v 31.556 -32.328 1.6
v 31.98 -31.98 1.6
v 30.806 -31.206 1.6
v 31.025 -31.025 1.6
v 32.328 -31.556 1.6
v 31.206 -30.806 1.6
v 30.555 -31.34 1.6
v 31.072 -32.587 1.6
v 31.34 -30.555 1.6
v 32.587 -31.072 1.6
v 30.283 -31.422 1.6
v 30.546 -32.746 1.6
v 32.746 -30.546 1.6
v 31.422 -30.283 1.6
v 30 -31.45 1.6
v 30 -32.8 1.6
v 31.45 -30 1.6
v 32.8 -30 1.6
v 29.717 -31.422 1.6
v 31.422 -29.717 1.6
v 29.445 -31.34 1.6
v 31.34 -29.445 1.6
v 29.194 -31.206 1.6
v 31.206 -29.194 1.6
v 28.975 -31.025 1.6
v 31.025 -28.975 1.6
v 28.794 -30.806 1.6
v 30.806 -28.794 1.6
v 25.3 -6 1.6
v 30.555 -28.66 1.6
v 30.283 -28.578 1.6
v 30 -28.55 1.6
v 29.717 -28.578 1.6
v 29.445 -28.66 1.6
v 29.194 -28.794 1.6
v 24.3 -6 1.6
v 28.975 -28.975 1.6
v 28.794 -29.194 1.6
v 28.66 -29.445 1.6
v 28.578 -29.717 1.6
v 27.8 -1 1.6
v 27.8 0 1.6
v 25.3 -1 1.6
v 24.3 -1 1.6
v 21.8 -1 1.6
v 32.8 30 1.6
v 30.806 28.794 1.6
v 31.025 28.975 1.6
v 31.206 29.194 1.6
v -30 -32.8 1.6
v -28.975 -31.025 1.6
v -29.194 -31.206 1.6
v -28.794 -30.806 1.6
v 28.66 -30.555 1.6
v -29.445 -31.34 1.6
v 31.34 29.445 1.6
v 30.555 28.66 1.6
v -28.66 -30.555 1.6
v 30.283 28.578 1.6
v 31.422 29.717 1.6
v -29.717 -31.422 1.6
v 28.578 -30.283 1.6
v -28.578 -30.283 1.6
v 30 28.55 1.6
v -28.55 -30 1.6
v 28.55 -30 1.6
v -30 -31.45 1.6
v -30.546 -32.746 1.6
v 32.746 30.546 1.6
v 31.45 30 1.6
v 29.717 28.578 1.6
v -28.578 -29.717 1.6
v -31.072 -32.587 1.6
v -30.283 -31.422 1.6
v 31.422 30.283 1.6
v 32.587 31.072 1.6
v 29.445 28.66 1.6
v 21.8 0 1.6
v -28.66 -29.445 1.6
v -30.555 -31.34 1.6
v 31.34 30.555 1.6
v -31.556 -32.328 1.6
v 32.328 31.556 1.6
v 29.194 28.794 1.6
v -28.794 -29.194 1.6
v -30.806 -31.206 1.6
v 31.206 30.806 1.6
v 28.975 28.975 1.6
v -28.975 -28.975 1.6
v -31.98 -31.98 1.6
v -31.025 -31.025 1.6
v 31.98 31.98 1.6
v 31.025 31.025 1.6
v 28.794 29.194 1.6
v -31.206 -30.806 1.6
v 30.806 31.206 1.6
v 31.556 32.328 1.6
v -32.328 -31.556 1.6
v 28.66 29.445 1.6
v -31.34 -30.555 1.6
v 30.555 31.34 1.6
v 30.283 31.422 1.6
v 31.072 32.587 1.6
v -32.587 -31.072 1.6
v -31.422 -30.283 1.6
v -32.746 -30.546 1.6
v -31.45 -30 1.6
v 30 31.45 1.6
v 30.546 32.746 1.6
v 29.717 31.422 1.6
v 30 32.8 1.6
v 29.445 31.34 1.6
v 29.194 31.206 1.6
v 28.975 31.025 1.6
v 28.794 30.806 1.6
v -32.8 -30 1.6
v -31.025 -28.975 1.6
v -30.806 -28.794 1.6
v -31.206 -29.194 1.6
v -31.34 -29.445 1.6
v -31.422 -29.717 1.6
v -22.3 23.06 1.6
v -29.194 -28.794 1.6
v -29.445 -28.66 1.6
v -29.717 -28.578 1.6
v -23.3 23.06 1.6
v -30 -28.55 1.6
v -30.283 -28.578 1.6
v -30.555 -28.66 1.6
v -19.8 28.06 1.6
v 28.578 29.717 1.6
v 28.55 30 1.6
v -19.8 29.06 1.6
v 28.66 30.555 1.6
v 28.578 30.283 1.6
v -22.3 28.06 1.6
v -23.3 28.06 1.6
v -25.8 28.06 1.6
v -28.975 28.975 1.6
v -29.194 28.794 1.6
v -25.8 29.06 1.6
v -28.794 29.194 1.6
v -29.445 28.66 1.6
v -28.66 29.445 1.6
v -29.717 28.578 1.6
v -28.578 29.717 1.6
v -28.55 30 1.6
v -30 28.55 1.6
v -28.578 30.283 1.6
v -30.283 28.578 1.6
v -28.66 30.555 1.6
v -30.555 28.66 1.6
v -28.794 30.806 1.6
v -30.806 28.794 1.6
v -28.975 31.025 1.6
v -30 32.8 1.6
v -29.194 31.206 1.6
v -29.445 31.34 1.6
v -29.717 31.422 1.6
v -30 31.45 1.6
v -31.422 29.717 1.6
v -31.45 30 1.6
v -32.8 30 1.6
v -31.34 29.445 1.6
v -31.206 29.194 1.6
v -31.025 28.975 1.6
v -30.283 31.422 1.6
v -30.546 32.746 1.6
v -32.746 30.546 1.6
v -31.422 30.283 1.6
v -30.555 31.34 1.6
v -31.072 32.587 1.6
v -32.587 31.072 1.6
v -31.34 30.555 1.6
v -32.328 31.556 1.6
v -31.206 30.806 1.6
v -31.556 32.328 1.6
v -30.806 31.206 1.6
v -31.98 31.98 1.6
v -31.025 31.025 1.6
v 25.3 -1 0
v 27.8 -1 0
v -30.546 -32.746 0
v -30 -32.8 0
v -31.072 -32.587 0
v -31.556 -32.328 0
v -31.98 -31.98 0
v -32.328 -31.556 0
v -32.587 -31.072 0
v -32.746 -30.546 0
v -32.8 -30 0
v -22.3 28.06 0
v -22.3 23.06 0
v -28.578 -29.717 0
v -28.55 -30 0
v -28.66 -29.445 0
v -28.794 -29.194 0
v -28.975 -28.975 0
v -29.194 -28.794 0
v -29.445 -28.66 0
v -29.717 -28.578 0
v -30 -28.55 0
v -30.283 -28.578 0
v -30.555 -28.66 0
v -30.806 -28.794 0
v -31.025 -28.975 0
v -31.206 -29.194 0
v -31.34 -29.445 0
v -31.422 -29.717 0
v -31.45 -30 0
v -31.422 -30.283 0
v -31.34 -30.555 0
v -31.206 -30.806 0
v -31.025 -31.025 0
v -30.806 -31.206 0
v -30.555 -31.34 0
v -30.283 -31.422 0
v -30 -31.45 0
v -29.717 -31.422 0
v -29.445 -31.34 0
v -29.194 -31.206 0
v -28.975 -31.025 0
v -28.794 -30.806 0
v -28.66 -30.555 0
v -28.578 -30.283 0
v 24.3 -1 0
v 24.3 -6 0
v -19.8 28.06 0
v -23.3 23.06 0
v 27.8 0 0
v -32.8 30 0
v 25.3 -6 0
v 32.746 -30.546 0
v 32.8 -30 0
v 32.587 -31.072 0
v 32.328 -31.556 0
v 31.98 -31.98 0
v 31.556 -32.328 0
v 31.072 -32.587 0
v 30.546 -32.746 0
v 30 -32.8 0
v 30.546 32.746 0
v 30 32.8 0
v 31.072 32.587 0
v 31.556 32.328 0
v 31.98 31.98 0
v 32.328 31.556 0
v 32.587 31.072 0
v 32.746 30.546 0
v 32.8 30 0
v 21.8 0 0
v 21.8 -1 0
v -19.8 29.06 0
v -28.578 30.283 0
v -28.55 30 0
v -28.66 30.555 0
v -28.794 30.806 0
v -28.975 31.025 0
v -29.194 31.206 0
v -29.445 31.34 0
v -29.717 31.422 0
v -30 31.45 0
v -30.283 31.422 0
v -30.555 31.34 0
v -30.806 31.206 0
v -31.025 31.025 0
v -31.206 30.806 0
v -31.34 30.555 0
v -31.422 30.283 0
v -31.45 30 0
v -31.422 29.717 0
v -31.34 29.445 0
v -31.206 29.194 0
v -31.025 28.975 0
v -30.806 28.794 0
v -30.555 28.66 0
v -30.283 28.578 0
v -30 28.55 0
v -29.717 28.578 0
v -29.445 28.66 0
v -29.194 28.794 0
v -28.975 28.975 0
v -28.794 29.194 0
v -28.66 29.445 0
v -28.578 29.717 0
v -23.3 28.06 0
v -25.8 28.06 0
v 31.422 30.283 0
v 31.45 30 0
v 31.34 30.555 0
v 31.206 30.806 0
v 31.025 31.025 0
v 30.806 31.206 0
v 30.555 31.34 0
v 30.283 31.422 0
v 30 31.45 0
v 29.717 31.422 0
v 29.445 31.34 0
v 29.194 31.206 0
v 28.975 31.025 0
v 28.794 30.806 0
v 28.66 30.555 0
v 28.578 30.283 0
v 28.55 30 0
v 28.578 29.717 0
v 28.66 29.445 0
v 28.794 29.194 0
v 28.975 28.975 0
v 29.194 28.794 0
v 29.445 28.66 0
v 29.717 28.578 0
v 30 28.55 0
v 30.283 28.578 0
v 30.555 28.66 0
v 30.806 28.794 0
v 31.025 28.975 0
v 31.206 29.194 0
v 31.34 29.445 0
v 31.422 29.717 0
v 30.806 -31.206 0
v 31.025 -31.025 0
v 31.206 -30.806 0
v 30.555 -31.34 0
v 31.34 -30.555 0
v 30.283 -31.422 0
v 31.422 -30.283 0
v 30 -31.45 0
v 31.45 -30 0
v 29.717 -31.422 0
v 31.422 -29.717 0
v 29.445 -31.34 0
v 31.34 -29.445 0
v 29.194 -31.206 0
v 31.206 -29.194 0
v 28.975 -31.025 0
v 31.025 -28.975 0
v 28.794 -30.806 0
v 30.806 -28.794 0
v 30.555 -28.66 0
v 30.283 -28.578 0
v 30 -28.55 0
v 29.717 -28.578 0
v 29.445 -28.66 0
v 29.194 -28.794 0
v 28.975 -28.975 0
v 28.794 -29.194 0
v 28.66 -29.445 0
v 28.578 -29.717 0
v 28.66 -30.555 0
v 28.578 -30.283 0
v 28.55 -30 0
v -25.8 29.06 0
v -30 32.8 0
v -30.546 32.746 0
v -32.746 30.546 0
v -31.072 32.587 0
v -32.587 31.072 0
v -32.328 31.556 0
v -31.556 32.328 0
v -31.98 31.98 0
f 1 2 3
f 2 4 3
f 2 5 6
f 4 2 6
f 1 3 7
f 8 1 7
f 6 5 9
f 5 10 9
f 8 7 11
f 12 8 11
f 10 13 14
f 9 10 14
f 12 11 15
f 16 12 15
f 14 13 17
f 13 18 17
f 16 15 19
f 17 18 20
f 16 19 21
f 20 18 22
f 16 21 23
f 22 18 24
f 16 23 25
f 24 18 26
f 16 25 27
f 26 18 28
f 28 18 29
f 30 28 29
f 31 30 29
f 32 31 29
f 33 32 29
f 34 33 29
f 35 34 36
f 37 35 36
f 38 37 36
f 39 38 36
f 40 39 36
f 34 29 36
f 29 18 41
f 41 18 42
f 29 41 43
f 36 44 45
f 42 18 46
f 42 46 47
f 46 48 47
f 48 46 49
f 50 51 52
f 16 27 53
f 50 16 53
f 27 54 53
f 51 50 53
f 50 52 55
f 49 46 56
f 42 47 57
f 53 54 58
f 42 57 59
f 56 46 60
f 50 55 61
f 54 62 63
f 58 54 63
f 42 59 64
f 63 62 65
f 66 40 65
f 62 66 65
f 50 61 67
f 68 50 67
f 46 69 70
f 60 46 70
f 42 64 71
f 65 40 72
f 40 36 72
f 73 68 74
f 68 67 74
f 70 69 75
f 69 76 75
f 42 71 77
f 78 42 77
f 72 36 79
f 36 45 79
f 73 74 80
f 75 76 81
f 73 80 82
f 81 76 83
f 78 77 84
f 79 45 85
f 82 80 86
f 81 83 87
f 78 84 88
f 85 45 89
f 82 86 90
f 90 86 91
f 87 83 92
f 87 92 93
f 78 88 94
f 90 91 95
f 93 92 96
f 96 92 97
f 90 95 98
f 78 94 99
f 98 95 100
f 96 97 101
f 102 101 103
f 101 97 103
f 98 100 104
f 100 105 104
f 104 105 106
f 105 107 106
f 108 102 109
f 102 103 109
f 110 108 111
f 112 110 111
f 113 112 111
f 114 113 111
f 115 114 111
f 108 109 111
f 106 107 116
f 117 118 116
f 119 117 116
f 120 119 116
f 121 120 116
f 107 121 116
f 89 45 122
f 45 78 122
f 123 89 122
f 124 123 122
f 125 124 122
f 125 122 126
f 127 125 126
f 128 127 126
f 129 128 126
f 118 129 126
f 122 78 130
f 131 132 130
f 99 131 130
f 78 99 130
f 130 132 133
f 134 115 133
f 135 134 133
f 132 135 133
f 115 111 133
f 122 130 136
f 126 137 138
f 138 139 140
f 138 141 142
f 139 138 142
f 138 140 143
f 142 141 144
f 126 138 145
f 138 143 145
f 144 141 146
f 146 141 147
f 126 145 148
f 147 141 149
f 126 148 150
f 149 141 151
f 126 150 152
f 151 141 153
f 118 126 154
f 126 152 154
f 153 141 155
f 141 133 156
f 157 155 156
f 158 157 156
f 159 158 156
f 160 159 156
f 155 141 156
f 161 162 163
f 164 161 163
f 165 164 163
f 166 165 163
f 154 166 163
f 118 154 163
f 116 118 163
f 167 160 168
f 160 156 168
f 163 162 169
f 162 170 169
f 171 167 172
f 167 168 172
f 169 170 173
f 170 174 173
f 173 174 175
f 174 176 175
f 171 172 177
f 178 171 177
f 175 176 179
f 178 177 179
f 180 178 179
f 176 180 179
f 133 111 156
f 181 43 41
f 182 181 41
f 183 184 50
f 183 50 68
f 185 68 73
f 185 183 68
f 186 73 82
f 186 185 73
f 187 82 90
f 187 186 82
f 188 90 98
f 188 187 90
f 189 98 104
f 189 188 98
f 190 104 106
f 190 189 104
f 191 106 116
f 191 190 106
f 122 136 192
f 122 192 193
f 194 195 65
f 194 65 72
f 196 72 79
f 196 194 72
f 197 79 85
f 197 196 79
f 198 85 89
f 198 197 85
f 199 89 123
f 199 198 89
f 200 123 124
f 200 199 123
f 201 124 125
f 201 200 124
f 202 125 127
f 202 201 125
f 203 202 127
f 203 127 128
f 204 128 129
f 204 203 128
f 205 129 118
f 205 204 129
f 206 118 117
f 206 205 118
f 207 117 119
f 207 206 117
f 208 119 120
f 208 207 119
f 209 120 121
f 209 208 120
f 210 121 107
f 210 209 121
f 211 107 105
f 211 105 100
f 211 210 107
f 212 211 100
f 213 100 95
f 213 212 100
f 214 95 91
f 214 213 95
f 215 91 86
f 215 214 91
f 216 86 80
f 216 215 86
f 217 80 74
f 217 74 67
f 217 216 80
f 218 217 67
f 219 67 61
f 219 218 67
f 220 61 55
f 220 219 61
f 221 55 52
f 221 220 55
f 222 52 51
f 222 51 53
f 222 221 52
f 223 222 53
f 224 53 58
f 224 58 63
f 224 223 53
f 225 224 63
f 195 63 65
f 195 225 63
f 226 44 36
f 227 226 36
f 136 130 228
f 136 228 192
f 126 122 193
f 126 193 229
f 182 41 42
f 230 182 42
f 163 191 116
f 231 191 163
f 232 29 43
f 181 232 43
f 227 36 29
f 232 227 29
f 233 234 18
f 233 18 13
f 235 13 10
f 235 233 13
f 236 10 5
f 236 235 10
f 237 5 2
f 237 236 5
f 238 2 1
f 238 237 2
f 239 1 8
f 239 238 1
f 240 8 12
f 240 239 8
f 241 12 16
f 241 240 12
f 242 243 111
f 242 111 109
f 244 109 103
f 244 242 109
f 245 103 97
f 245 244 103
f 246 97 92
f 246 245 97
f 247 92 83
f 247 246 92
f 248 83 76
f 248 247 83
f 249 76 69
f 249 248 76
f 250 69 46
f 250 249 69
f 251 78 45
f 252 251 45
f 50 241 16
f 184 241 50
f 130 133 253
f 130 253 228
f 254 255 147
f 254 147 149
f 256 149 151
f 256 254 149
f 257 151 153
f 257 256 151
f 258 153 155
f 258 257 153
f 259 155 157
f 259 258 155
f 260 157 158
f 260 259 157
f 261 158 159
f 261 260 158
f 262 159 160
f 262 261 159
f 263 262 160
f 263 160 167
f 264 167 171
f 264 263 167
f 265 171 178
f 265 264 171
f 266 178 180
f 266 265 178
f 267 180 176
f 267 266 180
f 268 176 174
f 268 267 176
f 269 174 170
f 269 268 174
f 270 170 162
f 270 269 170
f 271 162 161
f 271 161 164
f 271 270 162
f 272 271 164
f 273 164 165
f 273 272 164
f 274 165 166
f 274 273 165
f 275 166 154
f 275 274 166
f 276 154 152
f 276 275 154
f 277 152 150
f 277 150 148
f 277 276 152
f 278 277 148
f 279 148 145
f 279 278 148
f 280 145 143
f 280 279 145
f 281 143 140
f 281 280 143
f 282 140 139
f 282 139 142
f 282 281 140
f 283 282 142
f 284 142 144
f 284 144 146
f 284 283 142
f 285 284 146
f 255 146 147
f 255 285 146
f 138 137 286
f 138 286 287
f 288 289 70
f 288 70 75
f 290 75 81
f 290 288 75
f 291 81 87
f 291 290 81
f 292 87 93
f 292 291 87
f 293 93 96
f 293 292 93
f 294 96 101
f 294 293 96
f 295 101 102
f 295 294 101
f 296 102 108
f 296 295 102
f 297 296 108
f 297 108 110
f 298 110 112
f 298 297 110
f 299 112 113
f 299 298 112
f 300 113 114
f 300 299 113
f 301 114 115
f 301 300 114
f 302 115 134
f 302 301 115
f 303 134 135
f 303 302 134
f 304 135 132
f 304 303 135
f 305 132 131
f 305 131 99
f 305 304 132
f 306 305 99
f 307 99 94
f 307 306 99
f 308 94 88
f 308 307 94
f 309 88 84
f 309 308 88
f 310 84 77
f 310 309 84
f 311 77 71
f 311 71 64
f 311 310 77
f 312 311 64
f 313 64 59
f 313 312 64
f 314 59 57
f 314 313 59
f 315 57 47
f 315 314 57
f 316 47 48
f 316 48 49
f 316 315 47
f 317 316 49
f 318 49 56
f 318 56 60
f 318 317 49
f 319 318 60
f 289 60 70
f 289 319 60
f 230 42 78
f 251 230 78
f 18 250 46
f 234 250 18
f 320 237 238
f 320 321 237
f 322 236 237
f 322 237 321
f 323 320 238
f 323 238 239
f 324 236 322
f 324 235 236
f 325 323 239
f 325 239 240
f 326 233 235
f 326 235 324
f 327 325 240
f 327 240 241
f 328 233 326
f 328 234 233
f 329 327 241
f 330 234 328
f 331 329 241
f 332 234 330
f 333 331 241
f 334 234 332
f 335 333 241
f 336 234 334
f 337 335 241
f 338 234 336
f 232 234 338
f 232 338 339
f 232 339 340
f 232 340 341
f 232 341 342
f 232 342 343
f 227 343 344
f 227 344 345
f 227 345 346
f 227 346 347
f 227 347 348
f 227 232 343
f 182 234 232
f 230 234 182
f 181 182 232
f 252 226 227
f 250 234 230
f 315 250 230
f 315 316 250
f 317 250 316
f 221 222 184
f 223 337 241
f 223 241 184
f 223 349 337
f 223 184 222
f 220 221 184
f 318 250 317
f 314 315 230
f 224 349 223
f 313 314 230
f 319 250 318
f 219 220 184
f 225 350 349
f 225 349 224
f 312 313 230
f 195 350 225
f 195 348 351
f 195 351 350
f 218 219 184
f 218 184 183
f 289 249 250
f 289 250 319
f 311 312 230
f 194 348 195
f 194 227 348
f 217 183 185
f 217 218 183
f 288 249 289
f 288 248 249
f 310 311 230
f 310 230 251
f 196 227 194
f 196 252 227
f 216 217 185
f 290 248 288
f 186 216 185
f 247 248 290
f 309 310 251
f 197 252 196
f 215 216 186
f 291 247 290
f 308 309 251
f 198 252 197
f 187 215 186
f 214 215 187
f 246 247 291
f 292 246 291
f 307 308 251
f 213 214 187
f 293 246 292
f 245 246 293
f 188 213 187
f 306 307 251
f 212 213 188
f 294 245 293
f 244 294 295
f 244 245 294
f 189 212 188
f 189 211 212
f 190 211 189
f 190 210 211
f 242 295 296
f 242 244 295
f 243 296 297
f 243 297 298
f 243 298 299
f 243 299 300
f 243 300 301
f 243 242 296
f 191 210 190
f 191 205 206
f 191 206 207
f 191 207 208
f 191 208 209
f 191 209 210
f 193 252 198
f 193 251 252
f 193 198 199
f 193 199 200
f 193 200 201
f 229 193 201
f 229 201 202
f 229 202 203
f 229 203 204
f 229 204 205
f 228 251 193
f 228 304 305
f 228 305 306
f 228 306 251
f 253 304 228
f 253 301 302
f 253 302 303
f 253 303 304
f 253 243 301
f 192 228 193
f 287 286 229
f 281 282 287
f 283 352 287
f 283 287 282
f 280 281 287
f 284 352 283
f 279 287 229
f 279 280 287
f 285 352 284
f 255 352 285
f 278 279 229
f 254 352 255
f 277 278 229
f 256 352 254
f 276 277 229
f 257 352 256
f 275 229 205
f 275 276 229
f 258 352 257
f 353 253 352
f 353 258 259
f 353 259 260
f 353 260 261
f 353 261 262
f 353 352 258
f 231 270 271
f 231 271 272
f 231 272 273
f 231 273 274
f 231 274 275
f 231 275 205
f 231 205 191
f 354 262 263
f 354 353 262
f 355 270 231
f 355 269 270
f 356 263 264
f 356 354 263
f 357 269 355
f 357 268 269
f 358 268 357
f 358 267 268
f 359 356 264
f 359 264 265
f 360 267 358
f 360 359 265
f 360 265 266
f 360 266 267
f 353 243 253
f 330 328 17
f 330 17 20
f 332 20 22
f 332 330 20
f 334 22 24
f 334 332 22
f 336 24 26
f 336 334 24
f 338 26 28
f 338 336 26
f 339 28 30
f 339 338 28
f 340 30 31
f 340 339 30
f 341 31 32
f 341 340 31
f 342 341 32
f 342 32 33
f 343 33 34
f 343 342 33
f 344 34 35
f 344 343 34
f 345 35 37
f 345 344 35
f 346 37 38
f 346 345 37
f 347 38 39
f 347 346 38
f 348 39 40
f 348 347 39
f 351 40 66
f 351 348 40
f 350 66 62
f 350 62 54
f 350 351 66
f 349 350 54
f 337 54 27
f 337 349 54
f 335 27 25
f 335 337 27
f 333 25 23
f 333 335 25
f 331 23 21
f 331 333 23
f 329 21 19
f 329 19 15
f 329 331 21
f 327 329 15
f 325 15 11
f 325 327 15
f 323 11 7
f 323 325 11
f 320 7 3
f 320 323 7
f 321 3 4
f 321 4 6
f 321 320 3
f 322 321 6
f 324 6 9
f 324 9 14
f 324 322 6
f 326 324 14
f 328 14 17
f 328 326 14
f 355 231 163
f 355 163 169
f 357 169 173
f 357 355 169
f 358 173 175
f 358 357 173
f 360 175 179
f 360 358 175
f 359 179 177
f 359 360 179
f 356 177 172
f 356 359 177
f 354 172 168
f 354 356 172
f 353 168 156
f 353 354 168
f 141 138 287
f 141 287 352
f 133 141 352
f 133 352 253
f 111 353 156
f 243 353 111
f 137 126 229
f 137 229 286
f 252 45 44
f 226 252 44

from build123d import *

# Parameters (mm, degrees)
SKETCH_1_R          = 1.45
EXTRUDE_1_DEPTH     = 1.6
CUT_EXTRUDE_1_DEPTH = 1.6
CUT_EXTRUDE_2_DEPTH = 1.6


with BuildPart() as part:
    # 草图1 → 凸台-拉伸1 (new body)
    with BuildSketch(Plane.XY):
        with BuildLine():
            Line((-30, 32.8), (30, 32.8))
            ThreePointArc((30, 32.8), (31.979898987, 31.979898987), (32.8, 30))
            Line((32.8, 30), (32.8, -30))
            ThreePointArc((32.8, -30), (31.979898987, -31.979898987), (30, -32.8))
            Line((30, -32.8), (-30, -32.8))
            ThreePointArc((-30, -32.8), (-31.979898987, -31.979898987), (-32.8, -30))
            Line((-32.8, -30), (-32.8, 30))
            ThreePointArc((-32.8, 30), (-31.979898987, 31.979898987), (-30, 32.8))
        make_face()
        with Locations((-30, 30)):
            Circle(SKETCH_1_R, mode=Mode.SUBTRACT)
        with Locations((30, 30)):
            Circle(SKETCH_1_R, mode=Mode.SUBTRACT)
        with Locations((-30, -30)):
            Circle(SKETCH_1_R, mode=Mode.SUBTRACT)
        with Locations((30, -30)):
            Circle(SKETCH_1_R, mode=Mode.SUBTRACT)
    extrude(amount=EXTRUDE_1_DEPTH)

    # 草图2 → 切除-拉伸1 (cut)
    with BuildSketch(Plane.XY.offset(1.6)):
        Polygon((-25.8, 29.06), (-19.8, 29.06), (-19.8, 28.06), (-22.3, 28.06), (-22.3, 23.06), (-23.3, 23.06), (-23.3, 28.06), (-25.8, 28.06), align=None)
    extrude(amount=-CUT_EXTRUDE_1_DEPTH, mode=Mode.SUBTRACT)

    # 草图3 → 切除-拉伸2 (cut)
    with BuildSketch(Plane.XY.offset(1.6)):
        Polygon((25.3, -1), (27.8, -1), (27.8, 0), (21.8, 0), (21.8, -1), (24.3, -1), (24.3, -6), (25.3, -6), align=None)
    extrude(amount=-CUT_EXTRUDE_2_DEPTH, mode=Mode.SUBTRACT)


solid = part.part
